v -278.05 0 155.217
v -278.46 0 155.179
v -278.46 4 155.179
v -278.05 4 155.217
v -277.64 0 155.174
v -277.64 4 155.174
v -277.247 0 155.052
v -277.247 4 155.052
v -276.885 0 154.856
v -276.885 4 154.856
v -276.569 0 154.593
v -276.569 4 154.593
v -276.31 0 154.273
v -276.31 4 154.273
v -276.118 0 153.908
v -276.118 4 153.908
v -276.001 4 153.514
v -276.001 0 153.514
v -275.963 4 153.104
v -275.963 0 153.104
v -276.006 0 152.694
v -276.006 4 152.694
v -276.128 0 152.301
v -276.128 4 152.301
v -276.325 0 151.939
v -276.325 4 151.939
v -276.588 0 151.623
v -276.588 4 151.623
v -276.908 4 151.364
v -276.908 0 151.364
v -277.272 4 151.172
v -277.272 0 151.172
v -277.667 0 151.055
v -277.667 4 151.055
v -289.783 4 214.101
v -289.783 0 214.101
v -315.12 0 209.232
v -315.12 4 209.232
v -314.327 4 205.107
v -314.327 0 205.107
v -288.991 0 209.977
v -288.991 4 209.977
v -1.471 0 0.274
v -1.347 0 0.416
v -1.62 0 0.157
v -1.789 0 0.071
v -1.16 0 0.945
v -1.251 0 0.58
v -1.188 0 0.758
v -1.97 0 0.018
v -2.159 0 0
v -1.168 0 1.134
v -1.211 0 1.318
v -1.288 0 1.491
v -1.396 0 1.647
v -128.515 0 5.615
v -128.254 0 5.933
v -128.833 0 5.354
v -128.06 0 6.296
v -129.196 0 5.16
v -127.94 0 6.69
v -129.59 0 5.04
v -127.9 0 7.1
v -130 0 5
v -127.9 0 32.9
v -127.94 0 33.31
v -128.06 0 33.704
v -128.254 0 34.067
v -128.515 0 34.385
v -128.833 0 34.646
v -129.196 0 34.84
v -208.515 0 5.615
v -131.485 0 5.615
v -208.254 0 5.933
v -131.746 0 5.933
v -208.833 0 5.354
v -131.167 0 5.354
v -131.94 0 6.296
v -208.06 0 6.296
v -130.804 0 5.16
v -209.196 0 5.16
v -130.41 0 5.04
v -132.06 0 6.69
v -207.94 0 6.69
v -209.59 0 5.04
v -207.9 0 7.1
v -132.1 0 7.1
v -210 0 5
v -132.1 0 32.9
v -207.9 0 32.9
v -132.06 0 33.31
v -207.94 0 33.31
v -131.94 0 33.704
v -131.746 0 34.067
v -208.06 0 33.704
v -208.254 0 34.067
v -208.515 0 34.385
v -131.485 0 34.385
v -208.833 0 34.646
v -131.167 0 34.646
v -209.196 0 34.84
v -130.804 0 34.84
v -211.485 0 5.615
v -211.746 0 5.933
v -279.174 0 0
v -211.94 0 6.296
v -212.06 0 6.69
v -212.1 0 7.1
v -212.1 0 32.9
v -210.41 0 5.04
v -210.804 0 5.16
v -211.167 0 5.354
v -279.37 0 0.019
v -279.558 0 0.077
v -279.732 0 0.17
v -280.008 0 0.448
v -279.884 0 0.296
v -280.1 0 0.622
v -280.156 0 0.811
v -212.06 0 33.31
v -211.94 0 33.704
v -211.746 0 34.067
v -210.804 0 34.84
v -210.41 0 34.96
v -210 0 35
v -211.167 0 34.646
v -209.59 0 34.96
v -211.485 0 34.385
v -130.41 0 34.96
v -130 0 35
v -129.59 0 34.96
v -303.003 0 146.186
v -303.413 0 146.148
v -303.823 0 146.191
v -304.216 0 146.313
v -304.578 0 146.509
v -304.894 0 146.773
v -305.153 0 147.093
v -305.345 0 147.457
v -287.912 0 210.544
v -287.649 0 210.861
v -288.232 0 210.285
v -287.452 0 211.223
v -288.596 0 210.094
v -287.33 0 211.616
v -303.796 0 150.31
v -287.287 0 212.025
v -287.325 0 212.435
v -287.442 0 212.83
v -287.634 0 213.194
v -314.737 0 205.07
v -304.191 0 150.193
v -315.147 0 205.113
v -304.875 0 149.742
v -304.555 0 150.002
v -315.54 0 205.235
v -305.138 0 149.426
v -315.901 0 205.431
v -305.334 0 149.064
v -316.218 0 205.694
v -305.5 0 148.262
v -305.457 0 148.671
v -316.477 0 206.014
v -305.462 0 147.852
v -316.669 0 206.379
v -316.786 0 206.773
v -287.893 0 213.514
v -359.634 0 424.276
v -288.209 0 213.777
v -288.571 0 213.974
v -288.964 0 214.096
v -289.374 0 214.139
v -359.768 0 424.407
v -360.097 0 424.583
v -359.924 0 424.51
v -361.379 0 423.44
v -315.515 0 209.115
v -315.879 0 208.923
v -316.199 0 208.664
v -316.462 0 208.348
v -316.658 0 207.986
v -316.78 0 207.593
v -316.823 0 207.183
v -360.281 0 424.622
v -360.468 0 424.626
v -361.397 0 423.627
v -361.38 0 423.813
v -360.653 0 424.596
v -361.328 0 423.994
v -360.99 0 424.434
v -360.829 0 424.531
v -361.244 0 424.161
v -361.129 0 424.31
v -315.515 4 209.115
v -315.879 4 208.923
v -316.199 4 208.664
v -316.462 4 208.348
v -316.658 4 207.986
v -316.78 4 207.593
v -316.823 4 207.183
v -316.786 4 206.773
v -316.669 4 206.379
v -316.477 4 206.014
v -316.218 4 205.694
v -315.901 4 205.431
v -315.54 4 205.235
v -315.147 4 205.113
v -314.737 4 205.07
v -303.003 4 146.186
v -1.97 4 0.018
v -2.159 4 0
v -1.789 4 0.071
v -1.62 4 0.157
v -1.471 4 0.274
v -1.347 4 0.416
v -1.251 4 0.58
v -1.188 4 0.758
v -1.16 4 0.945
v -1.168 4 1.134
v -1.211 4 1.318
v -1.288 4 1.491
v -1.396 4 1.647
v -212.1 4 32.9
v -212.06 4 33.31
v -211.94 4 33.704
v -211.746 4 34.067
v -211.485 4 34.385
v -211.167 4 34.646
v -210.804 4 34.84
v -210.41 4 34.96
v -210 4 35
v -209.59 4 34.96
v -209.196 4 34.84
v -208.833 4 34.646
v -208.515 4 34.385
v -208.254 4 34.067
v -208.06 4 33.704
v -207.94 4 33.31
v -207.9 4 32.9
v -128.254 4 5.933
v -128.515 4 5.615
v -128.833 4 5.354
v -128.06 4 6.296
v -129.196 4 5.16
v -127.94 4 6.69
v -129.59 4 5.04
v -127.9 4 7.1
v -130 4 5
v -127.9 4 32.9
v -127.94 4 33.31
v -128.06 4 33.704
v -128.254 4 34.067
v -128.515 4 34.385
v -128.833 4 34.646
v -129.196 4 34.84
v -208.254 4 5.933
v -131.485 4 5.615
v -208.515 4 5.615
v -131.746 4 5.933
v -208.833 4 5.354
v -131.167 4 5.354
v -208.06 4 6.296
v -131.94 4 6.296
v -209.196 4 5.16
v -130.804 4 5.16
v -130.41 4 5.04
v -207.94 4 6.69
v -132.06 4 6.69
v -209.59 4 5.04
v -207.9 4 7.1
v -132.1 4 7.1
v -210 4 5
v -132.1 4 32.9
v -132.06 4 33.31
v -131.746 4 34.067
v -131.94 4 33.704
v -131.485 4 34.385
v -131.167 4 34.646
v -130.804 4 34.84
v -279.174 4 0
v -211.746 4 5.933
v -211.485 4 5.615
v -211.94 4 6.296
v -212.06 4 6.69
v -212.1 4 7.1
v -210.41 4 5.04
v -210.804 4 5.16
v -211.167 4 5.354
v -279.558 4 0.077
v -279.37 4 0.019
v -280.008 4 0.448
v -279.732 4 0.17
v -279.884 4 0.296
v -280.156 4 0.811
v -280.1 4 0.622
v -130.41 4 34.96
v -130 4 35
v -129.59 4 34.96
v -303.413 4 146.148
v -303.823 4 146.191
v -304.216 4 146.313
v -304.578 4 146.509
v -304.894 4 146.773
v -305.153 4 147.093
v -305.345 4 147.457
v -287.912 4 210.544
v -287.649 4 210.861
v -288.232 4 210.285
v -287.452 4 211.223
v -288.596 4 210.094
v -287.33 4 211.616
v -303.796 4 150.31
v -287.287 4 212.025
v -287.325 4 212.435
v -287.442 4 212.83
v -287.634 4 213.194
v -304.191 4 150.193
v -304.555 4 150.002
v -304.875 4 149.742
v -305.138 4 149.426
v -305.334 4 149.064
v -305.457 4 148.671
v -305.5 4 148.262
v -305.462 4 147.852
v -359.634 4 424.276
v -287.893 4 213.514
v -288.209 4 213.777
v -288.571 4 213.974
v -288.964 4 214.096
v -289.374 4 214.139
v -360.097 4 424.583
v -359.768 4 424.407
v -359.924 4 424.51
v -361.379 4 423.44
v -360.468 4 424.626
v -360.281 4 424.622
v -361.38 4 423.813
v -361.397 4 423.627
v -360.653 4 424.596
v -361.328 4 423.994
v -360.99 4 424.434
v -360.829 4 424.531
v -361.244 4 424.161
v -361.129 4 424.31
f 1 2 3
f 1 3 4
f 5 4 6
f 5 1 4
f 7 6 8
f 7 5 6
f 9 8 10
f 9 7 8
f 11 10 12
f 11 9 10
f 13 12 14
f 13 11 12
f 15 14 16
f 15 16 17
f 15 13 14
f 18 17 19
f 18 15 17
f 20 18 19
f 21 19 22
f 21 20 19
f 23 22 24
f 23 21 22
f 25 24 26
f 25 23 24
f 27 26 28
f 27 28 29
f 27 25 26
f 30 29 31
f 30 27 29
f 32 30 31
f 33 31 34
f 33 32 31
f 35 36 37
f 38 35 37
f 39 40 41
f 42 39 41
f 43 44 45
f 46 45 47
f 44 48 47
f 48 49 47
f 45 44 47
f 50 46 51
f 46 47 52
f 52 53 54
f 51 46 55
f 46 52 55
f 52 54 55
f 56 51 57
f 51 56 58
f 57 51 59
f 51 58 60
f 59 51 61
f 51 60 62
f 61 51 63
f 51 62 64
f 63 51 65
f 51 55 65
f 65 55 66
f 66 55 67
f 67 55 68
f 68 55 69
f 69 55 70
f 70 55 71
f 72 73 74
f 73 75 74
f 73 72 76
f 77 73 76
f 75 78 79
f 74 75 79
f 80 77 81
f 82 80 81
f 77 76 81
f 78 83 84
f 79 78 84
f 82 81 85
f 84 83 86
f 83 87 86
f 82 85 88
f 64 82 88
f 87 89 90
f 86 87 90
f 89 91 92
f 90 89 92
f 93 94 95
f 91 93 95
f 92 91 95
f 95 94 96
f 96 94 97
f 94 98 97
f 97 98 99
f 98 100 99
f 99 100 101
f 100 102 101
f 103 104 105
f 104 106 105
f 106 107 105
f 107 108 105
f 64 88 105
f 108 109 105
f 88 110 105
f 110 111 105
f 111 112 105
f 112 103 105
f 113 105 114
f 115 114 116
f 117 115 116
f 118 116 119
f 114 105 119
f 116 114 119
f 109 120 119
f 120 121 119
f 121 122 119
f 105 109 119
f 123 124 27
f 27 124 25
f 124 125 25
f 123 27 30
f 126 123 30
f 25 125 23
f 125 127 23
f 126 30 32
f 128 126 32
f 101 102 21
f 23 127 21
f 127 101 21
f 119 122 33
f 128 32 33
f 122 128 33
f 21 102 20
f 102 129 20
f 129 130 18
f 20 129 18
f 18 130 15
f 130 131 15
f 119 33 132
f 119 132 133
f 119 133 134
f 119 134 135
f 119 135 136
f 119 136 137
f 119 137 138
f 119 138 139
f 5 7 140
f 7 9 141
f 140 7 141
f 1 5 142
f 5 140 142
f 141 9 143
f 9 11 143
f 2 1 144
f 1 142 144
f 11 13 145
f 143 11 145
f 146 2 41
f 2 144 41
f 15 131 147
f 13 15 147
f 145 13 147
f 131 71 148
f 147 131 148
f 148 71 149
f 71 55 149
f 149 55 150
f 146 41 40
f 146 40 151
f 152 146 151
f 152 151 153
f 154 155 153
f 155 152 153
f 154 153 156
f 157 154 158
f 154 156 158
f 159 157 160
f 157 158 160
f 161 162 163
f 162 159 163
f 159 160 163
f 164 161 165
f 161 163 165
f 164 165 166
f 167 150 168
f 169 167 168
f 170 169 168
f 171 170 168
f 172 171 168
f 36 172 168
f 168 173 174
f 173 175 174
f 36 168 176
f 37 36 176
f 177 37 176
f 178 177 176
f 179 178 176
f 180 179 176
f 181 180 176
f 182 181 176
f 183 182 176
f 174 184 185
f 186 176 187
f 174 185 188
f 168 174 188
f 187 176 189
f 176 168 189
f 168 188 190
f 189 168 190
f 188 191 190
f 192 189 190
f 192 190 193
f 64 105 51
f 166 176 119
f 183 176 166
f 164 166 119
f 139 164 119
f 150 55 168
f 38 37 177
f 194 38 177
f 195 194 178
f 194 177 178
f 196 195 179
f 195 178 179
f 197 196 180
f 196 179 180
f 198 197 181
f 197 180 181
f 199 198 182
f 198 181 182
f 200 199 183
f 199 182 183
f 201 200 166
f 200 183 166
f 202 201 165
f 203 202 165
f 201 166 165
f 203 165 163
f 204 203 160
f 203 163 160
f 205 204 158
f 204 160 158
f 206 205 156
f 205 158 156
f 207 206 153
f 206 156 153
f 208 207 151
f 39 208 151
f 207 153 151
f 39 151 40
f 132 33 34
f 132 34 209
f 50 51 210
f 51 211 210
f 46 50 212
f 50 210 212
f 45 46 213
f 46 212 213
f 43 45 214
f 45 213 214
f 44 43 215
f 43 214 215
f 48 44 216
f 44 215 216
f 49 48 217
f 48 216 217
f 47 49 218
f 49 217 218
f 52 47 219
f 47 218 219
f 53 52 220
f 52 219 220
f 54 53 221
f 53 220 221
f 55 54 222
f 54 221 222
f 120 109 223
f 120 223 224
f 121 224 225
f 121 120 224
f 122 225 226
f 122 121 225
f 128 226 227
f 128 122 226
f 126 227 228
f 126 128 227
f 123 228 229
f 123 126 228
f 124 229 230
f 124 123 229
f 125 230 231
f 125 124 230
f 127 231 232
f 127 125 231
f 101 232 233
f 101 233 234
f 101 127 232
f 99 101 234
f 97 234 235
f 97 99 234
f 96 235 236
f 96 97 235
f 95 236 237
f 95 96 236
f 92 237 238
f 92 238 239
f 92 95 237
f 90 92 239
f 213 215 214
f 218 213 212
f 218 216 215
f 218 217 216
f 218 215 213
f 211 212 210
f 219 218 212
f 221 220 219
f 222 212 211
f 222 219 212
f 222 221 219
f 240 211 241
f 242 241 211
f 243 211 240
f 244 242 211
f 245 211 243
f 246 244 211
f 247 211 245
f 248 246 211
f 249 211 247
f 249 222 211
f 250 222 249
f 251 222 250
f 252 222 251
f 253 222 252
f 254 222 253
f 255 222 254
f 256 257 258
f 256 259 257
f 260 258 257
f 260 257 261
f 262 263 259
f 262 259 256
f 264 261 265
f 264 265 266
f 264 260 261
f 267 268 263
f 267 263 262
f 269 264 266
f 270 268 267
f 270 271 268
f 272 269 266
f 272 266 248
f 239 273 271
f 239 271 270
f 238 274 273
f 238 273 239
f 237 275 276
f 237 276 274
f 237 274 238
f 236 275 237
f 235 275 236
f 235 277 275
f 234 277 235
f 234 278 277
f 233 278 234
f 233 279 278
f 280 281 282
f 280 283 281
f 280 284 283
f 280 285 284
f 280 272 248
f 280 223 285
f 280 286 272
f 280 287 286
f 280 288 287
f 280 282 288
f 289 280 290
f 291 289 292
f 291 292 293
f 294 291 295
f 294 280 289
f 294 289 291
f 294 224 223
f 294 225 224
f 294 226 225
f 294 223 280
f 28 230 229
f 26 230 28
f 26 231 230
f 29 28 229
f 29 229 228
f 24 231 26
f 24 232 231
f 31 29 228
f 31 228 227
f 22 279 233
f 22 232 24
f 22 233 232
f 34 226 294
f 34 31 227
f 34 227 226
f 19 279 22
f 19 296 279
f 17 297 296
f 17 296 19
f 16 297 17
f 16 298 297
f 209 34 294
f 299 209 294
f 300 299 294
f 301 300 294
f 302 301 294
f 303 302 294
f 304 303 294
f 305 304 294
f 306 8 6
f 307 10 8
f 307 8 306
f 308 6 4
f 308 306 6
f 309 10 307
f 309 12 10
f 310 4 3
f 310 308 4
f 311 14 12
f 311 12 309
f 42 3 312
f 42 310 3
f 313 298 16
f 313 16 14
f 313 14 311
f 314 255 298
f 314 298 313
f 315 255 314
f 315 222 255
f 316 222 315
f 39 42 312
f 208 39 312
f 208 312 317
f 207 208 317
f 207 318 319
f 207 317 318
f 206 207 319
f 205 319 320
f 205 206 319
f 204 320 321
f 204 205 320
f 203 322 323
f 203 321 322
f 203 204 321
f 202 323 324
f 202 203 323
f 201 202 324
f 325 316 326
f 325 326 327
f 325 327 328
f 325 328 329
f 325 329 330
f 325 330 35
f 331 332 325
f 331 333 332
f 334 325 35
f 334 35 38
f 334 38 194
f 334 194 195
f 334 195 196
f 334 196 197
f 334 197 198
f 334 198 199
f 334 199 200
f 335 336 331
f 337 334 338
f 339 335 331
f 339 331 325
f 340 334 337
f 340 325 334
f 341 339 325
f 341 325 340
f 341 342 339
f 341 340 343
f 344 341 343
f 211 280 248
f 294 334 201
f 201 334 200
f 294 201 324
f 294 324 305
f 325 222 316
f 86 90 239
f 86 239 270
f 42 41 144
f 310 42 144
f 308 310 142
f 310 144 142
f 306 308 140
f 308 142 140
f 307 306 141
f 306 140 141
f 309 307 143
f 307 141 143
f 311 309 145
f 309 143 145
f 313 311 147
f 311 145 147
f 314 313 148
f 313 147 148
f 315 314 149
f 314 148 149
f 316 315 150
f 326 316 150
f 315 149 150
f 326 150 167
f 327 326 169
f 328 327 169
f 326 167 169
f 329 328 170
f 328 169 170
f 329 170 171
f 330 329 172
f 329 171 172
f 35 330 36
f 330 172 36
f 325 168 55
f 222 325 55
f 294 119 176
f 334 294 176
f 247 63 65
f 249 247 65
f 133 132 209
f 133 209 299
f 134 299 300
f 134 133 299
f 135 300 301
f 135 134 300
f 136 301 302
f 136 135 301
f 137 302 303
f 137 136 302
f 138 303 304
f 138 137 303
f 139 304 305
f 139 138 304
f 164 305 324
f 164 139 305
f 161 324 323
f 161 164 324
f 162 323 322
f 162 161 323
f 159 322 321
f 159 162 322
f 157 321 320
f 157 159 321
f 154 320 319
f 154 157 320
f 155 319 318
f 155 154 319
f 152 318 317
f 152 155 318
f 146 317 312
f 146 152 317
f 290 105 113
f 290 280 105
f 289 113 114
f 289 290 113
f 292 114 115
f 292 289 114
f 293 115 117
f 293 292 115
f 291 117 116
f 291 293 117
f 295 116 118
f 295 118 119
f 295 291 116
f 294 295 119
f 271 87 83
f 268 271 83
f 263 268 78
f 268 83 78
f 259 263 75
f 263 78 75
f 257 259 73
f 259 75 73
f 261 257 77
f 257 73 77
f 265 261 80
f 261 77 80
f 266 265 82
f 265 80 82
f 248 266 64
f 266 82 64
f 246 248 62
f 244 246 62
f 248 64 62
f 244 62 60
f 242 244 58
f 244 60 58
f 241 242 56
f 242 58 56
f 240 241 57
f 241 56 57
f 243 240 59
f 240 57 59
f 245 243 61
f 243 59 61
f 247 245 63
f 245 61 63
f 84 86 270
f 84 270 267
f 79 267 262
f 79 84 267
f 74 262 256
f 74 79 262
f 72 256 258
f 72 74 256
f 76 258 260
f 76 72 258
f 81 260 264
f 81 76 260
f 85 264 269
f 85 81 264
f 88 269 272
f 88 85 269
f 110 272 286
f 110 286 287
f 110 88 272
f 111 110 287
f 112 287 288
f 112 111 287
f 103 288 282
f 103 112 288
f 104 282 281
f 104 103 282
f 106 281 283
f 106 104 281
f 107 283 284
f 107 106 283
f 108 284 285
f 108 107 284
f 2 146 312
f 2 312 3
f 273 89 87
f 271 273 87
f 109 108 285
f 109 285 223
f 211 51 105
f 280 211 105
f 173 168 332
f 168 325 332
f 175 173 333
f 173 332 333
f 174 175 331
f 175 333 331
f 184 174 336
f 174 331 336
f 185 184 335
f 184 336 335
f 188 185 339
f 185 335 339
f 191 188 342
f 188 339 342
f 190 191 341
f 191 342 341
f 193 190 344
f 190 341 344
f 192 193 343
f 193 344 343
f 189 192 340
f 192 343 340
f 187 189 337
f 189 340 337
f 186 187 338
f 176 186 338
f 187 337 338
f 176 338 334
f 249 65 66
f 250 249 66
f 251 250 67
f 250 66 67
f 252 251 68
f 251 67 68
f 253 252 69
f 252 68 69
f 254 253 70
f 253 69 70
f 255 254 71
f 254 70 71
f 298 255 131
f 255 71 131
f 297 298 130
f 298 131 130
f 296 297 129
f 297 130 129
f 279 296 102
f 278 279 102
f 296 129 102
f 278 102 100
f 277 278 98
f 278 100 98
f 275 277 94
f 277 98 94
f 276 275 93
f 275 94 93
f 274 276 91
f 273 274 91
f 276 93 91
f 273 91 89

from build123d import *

# Parameters (mm, degrees)
BOSS_EXTRUDE1_DEPTH = 4
FILLET1_R           = 1


with BuildPart() as part:
    # Sketch1 → Boss-Extrude1 (new body)
    with BuildSketch(Plane(origin=(0, 0, 0), x_dir=(-1, 0, 0), z_dir=(0, 1, 0))):
        Polygon((0, 0), (280, 0), (362.098214286, 427.182494036), align=None)
        with BuildLine():
            Line((207.9, 32.9), (207.9, 7.1))
            ThreePointArc((207.9, 7.1), (210, 5), (212.1, 7.1))
            Line((212.1, 7.1), (212.1, 32.9))
            ThreePointArc((212.1, 32.9), (210, 35), (207.9, 32.9))
        make_face(mode=Mode.SUBTRACT)
        with BuildLine():
            Line((132.1, 32.9), (132.1, 7.1))
            ThreePointArc((132.1, 7.1), (130, 5), (127.9, 7.1))
            Line((127.9, 7.1), (127.9, 32.9))
            ThreePointArc((127.9, 32.9), (130, 35), (132.1, 32.9))
        make_face(mode=Mode.SUBTRACT)
        with BuildLine():
            Line((277.666908222, 151.054979007), (303.003249248, 146.185705608))
            ThreePointArc((303.003249248, 146.185705608), (305.46184577, 147.851629717), (303.795921661, 150.31022624))
            Line((303.795921661, 150.31022624), (278.459580636, 155.179499639))
            ThreePointArc((278.459580636, 155.179499639), (276.000984113, 153.51357553), (277.666908222, 151.054979007))
        make_face(mode=Mode.SUBTRACT)
        with BuildLine():
            Line((289.783472261, 214.101222954), (315.119813287, 209.231949555))
            ThreePointArc((315.119813287, 209.231949555), (316.785737396, 206.773353032), (314.327140873, 205.107428923))
            Line((314.327140873, 205.107428923), (288.990799848, 209.976702322))
            ThreePointArc((288.990799848, 209.976702322), (287.324875738, 212.435298845), (289.783472261, 214.101222954))
        make_face(mode=Mode.SUBTRACT)
    extrude(amount=BOSS_EXTRUDE1_DEPTH)

    # Fillet1
    fillet1_edges = [part.edges().sort_by_distance(p)[0] for p in [
        (-362.098214286, 2, 427.182494036),
        (-280, 2, 0),
        (0, 2, 0),
    ]]
    fillet(fillet1_edges, radius=FILLET1_R)


solid = part.part
